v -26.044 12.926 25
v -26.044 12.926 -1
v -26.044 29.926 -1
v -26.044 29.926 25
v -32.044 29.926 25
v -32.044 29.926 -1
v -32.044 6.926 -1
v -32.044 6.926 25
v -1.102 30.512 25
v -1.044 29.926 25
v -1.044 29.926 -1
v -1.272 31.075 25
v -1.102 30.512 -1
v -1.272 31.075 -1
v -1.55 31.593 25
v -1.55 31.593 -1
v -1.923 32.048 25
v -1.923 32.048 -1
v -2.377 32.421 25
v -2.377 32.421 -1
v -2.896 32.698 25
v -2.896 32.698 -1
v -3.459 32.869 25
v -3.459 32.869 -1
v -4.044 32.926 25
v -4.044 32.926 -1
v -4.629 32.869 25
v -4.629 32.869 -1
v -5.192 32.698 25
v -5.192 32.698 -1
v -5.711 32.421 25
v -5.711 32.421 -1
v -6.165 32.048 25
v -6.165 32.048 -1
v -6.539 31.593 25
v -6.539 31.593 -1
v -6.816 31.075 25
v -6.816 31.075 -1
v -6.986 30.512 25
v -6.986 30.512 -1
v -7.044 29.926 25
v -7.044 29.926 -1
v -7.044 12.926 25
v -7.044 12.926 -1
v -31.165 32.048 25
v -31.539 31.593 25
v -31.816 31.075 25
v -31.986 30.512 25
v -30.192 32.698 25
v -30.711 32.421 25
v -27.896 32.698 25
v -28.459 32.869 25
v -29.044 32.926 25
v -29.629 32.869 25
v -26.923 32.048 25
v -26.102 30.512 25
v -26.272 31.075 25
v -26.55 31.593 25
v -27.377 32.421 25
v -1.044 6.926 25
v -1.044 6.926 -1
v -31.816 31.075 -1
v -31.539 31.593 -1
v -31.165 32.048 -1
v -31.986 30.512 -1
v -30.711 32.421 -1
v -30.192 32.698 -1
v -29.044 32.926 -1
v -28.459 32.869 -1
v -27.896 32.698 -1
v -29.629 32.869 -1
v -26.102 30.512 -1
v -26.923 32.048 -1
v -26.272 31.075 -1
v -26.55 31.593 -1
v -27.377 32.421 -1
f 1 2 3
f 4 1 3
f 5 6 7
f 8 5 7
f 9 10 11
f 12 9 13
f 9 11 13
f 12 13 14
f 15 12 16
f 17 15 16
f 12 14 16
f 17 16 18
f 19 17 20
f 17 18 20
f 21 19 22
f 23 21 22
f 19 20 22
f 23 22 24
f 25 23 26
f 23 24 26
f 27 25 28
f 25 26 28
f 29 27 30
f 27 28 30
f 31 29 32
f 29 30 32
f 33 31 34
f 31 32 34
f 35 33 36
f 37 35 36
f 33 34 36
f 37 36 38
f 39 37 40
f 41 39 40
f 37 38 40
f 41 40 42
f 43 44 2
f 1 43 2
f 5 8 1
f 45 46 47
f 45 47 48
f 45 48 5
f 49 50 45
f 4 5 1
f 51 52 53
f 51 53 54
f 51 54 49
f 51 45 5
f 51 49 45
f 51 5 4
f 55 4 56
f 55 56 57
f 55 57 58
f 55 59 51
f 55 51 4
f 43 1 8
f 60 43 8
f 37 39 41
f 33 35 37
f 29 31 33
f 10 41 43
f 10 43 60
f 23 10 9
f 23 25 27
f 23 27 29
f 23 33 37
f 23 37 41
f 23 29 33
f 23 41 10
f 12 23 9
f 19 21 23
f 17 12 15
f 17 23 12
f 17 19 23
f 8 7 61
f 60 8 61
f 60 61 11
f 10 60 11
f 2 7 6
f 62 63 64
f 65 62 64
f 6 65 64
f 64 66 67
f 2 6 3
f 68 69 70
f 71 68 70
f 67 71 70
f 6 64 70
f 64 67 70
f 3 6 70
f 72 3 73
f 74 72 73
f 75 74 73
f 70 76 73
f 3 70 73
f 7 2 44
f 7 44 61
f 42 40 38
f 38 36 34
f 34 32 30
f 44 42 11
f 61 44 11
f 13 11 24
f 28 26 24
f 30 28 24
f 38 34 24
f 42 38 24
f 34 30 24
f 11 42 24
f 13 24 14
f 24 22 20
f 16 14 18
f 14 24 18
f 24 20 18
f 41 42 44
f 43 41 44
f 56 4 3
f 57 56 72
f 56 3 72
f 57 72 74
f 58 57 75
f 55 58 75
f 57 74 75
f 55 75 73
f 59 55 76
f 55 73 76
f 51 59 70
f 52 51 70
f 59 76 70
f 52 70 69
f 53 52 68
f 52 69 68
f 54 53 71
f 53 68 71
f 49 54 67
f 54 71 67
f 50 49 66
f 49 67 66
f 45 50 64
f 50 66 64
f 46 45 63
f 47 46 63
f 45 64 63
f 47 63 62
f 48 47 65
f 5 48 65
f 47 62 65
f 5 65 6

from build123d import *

# Parameters (mm, degrees)
BOSS_EXTRUDE5_DEPTH      = 25
BOSS_EXTRUDE5_DEPTH_BACK = 1


with BuildPart() as part:
    # Sketch2 → Boss-Extrude5 (new, two sides: drawn at the far end of the back side and taken through both)
    with BuildSketch(Plane.XY.offset(-BOSS_EXTRUDE5_DEPTH_BACK)):
        with BuildLine():
            Line((-32.044117647, 29.926470588), (-32.044117647, 6.926470588))
            Line((-32.044117647, 6.926470588), (-1.044117647, 6.926470588))
            Line((-1.044117647, 6.926470588), (-1.044117647, 29.926470588))
            ThreePointArc((-1.044117647, 29.926470588), (-4.044117647, 32.926470588), (-7.044117647, 29.926470588))
            Line((-7.044117647, 29.926470588), (-7.044117647, 12.926470588))
            Line((-7.044117647, 12.926470588), (-26.044117647, 12.926470588))
            Line((-26.044117647, 12.926470588), (-26.044117647, 29.926470588))
            ThreePointArc((-26.044117647, 29.926470588), (-29.044117647, 32.926470588), (-32.044117647, 29.926470588))
        make_face()
    extrude(amount=BOSS_EXTRUDE5_DEPTH + BOSS_EXTRUDE5_DEPTH_BACK)


solid = part.part
